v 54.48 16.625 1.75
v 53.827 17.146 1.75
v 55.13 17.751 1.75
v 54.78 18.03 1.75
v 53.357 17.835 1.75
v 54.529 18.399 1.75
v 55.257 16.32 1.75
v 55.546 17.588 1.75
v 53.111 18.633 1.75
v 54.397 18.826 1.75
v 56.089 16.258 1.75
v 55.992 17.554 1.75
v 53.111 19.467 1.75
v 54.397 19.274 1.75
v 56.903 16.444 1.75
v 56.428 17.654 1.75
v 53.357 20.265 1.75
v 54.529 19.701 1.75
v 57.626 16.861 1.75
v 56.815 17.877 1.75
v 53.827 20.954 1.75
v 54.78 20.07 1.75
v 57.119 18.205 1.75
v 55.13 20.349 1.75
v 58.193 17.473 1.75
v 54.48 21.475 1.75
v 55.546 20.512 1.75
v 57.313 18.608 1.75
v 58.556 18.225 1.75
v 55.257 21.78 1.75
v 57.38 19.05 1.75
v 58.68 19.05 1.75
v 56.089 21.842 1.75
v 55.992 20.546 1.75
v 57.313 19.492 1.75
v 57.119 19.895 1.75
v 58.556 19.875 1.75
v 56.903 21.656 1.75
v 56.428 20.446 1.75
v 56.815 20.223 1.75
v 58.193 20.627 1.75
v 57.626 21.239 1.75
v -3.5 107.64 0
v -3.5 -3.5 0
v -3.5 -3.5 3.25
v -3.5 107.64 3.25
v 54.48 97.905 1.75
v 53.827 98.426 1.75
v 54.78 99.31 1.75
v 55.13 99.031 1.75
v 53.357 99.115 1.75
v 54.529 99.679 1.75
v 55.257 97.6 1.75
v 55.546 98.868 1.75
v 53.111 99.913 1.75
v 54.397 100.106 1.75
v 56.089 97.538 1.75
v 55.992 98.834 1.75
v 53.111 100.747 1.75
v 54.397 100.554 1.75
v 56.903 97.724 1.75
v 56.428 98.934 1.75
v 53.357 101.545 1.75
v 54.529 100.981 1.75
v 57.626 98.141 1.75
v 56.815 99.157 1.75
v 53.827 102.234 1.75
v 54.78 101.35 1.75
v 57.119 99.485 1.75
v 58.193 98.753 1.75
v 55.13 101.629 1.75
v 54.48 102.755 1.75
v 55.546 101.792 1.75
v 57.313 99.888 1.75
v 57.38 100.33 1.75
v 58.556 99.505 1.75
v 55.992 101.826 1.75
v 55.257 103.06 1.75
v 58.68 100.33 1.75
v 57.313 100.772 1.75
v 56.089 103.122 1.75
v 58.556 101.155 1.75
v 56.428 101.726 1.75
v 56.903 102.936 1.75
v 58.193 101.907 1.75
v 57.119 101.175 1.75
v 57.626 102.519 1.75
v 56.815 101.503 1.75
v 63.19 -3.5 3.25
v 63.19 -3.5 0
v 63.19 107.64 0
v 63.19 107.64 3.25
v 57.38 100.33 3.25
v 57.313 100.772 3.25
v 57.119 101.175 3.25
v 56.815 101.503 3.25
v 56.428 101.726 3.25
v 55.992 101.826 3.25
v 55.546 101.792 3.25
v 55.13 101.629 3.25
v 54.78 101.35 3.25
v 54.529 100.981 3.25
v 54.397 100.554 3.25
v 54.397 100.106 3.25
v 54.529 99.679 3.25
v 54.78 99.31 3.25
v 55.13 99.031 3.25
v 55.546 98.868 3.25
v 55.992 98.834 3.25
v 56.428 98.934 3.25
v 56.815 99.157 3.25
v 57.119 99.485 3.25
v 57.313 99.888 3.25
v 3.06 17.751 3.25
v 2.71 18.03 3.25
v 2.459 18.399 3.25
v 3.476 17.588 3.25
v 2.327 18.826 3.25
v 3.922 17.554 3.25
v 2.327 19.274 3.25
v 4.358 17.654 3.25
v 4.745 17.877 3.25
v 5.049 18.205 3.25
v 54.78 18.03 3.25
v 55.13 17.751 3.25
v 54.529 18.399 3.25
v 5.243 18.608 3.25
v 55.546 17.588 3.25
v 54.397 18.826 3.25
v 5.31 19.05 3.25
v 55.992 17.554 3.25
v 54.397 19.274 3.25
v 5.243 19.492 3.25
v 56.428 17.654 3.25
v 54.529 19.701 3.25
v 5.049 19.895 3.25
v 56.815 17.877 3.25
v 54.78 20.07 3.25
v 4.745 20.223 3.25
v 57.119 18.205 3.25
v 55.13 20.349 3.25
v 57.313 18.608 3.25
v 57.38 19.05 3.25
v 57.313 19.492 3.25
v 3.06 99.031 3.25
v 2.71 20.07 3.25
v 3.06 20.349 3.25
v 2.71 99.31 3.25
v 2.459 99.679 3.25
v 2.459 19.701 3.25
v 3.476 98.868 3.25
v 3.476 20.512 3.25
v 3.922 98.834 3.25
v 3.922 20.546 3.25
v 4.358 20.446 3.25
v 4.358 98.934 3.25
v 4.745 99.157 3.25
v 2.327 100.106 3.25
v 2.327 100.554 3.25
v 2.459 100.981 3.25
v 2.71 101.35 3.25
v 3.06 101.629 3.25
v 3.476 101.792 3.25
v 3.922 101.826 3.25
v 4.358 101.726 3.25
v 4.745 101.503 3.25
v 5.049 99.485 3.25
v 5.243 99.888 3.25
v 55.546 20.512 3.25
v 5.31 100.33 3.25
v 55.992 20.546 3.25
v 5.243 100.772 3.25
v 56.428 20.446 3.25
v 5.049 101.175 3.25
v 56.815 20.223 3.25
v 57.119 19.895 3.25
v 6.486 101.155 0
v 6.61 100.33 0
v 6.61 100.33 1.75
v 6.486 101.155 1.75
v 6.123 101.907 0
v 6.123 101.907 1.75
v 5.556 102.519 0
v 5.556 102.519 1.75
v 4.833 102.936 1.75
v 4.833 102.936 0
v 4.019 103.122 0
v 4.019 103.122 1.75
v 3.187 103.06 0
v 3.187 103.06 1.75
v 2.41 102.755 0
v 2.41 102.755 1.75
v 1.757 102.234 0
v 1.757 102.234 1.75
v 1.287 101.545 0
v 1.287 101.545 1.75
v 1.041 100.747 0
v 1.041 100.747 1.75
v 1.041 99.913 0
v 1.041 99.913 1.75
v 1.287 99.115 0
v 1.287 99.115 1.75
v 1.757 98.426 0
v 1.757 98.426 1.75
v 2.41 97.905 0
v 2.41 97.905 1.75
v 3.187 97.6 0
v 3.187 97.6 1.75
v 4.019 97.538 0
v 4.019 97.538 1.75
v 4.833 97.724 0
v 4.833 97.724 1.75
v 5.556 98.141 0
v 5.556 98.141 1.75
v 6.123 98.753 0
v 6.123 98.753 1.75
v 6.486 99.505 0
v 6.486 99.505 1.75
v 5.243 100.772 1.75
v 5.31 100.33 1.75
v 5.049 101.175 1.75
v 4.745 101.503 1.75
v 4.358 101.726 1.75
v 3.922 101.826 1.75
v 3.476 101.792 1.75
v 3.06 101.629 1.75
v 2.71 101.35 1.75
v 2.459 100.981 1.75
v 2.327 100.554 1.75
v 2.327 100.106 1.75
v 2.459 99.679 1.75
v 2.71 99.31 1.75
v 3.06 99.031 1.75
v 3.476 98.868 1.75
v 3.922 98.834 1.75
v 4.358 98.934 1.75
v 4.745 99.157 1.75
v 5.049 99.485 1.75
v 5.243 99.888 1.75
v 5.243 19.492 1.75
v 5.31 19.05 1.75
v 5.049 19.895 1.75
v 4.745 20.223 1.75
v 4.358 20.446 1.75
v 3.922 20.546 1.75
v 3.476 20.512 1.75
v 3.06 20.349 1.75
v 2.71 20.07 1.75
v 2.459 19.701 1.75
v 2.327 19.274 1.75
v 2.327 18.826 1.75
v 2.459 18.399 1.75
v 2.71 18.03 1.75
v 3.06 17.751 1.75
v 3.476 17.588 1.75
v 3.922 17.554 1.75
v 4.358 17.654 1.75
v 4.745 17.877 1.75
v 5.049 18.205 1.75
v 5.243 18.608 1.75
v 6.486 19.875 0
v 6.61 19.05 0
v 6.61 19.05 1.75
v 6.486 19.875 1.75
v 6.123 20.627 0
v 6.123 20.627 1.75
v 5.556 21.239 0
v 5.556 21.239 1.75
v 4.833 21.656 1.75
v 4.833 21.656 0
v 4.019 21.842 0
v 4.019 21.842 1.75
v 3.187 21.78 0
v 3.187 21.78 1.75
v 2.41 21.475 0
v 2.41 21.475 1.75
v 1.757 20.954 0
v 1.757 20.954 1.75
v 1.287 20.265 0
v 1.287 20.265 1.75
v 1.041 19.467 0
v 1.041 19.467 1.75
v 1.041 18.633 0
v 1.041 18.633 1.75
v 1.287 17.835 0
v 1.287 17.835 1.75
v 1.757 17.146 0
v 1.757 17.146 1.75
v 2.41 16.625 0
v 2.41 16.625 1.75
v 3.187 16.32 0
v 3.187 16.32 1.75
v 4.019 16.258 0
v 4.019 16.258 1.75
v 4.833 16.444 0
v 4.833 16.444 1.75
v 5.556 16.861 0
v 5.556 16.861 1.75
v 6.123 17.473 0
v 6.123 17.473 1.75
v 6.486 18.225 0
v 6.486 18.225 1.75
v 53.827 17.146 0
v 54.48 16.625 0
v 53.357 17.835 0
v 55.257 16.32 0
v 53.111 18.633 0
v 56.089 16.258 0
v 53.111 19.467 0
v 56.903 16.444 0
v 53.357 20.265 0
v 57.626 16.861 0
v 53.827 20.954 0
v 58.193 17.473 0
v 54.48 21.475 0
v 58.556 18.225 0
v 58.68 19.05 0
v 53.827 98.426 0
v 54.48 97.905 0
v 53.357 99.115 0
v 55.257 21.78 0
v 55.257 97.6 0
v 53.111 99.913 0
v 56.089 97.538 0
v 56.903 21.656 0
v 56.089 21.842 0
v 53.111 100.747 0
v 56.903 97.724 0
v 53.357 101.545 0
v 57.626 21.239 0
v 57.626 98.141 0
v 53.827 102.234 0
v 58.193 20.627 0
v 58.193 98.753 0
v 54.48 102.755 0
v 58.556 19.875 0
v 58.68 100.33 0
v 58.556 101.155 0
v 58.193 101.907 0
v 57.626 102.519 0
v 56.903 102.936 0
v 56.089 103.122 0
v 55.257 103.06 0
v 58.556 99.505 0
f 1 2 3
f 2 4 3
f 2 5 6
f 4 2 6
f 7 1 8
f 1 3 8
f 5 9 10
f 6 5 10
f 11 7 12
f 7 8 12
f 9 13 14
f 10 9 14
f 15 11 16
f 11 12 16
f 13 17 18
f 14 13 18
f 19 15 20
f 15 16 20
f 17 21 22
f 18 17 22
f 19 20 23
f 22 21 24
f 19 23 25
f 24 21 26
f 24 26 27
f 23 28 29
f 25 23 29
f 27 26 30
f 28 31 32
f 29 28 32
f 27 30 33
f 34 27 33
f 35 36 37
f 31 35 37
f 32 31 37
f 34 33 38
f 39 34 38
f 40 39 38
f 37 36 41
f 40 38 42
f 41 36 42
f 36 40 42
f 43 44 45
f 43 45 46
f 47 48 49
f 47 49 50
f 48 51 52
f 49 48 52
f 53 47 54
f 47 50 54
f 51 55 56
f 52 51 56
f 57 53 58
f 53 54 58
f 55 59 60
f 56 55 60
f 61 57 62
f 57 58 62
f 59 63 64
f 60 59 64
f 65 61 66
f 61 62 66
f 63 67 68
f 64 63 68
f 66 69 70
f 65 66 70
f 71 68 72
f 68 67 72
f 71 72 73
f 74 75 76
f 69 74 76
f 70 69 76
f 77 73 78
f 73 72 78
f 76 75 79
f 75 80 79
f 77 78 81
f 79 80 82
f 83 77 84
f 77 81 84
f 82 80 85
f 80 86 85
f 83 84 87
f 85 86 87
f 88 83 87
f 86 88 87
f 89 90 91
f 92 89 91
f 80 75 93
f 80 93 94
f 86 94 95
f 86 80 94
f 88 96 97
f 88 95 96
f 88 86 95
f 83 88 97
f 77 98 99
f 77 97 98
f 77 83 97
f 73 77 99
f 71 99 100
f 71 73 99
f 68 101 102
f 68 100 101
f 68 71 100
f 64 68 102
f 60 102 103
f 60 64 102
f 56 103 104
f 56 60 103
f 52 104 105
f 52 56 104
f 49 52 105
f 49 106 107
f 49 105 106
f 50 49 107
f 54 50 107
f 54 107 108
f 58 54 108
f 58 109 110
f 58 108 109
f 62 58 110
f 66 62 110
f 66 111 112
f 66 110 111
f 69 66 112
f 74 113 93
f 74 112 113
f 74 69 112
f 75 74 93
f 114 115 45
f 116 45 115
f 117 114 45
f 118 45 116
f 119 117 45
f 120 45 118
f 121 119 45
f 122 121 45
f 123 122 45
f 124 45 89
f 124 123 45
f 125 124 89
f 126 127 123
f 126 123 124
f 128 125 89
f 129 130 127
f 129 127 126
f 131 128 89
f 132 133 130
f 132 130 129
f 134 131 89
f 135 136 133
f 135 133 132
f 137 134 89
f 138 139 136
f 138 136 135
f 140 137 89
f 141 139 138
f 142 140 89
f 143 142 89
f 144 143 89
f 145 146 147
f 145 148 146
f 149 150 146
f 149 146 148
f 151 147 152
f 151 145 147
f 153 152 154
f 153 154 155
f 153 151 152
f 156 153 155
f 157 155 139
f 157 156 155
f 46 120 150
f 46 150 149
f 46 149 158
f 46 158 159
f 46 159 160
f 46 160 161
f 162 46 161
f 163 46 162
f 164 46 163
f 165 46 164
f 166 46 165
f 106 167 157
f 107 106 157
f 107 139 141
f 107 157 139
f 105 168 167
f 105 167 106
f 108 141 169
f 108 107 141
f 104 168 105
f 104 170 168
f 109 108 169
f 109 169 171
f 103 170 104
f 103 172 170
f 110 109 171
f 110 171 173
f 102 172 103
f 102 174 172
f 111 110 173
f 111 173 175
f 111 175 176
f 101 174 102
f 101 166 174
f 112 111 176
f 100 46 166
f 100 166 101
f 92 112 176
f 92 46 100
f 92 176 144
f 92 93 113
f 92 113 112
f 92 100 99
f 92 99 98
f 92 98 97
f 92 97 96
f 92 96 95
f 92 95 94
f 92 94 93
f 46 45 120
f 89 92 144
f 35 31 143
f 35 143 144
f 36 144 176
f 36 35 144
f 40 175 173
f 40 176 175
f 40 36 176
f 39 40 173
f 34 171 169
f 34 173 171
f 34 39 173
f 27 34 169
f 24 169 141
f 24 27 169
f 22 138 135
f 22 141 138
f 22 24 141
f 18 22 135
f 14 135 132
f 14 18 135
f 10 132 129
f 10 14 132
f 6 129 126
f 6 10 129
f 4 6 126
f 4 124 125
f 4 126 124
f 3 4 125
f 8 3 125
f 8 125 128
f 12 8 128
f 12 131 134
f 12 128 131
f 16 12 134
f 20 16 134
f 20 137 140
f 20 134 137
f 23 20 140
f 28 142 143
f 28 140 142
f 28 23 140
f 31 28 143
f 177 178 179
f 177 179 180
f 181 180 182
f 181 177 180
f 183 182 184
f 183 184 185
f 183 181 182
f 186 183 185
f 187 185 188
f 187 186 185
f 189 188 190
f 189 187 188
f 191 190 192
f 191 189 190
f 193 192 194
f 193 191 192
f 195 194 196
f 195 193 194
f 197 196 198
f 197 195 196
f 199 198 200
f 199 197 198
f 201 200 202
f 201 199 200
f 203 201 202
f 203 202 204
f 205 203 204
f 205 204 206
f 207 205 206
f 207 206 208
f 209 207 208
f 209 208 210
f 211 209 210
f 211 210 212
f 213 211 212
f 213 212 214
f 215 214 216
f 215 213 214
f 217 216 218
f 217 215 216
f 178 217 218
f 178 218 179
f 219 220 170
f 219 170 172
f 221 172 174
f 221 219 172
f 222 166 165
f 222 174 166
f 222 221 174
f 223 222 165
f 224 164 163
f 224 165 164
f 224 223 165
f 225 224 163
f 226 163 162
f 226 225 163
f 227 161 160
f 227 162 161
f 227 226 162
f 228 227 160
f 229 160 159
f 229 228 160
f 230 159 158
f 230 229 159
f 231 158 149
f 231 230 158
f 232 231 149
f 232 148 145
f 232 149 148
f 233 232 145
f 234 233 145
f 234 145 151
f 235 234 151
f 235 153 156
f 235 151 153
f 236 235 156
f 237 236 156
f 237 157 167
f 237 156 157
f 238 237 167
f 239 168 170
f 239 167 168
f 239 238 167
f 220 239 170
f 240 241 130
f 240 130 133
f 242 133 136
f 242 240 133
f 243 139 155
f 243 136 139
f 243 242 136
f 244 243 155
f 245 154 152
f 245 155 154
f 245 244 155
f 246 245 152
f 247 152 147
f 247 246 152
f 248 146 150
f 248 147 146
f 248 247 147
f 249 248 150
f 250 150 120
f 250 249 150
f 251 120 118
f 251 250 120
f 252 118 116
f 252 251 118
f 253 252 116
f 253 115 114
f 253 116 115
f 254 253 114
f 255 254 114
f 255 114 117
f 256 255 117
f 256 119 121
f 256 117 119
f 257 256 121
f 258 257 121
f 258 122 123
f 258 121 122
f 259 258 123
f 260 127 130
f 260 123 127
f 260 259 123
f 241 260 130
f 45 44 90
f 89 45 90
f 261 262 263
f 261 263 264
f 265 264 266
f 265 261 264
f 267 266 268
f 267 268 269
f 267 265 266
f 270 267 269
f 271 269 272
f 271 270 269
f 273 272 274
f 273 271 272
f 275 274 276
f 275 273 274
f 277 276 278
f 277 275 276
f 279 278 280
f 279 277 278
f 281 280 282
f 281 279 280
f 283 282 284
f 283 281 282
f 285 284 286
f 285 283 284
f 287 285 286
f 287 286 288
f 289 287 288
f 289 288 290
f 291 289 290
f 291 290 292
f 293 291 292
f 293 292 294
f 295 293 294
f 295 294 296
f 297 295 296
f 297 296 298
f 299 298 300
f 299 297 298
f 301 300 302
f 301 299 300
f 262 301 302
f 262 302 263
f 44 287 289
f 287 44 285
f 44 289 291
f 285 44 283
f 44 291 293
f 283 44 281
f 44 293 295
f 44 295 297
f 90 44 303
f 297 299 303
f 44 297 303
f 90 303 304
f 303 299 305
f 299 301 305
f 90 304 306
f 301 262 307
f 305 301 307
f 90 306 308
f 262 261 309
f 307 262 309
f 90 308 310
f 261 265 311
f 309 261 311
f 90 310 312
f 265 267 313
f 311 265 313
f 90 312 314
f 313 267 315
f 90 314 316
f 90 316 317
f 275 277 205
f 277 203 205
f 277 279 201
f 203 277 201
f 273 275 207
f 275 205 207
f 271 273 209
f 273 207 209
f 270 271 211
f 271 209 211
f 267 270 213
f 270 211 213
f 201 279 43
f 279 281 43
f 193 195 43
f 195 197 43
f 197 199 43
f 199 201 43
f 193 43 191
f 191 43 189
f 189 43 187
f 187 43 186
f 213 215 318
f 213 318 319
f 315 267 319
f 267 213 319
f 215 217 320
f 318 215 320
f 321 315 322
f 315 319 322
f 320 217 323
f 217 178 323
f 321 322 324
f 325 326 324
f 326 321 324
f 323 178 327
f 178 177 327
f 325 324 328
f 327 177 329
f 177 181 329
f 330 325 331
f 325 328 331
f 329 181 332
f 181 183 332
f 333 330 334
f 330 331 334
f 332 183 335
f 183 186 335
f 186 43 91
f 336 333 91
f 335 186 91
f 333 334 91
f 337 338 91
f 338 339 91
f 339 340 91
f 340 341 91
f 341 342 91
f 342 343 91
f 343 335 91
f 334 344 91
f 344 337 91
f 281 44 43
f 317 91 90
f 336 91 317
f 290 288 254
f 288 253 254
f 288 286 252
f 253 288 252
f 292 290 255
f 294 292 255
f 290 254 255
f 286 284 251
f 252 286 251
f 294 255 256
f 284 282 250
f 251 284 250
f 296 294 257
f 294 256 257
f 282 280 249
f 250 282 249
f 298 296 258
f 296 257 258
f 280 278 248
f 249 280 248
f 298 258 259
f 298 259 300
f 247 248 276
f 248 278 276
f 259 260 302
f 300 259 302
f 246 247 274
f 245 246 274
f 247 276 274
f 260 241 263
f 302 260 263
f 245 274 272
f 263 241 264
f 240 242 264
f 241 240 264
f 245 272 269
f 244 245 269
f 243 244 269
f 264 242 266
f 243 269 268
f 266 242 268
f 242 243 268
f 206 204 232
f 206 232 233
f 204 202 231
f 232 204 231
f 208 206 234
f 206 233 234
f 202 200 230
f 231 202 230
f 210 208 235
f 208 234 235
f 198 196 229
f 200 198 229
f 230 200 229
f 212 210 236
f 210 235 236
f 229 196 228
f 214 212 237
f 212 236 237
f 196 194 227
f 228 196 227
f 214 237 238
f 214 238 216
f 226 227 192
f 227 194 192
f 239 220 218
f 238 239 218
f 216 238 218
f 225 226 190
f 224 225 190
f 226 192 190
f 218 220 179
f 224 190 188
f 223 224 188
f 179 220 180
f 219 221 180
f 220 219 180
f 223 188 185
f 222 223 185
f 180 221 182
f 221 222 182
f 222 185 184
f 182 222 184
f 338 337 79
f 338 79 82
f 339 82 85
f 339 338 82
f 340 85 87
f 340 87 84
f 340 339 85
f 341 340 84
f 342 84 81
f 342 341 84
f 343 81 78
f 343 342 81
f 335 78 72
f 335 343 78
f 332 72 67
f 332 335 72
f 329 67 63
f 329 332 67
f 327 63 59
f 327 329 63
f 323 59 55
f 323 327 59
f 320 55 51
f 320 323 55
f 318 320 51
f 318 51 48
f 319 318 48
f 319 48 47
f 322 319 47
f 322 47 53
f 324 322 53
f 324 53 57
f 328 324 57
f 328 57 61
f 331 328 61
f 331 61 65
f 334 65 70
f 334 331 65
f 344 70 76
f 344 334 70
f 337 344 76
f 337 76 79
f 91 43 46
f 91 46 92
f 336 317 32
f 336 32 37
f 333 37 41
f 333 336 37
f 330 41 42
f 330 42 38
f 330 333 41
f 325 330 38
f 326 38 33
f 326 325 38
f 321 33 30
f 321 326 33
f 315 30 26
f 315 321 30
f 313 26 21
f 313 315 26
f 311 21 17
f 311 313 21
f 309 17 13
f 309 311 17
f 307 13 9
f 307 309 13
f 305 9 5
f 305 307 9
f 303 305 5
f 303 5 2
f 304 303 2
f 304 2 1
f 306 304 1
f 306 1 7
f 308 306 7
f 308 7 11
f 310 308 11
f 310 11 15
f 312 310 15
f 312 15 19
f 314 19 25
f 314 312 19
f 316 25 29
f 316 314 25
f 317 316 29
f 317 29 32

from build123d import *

# Parameters (mm, degrees)
CYLINDER007_R     = 2.8
CYLINDER007_DEPTH = 1.75
CYLINDER006_R     = 2.8
CYLINDER006_DEPTH = 1.75
CYLINDER005_R     = 2.8
CYLINDER005_DEPTH = 1.75
CYLINDER004_R     = 2.8
CYLINDER004_DEPTH = 1.75
CYLINDER003_R     = 1.5
CYLINDER003_DEPTH = 10
CYLINDER002_R     = 1.5
CYLINDER002_DEPTH = 10
CYLINDER001_R     = 1.5
CYLINDER001_DEPTH = 10
CYLINDER_R        = 1.5
CYLINDER_DEPTH    = 10
BOX001_W          = 66.69
BOX001_H          = 111.14
BOX001_DEPTH      = 3.25


with BuildPart() as cylinder007:
    # Cylinder007 → Cylinder007 (new body)
    with BuildSketch(Plane(origin=(55.88, 100.33, 0), x_dir=(1, 0, 0), z_dir=(0, 0, 1))):
        Circle(CYLINDER007_R)
    extrude(amount=CYLINDER007_DEPTH)


with BuildPart() as cylinder006:
    # Cylinder006 → Cylinder006 (new body)
    with BuildSketch(Plane(origin=(3.81, 100.33, 0), x_dir=(1, 0, 0), z_dir=(0, 0, 1))):
        Circle(CYLINDER006_R)
    extrude(amount=CYLINDER006_DEPTH)


with BuildPart() as cylinder005:
    # Cylinder005 → Cylinder005 (new body)
    with BuildSketch(Plane(origin=(55.88, 19.05, 0), x_dir=(1, 0, 0), z_dir=(0, 0, 1))):
        Circle(CYLINDER005_R)
    extrude(amount=CYLINDER005_DEPTH)


with BuildPart() as cylinder004:
    # Cylinder004 → Cylinder004 (new body)
    with BuildSketch(Plane(origin=(3.81, 19.05, 0), x_dir=(1, 0, 0), z_dir=(0, 0, 1))):
        Circle(CYLINDER004_R)
    extrude(amount=CYLINDER004_DEPTH)


with BuildPart() as cylinder003:
    # Cylinder003 → Cylinder003 (new body)
    with BuildSketch(Plane(origin=(55.88, 100.33, -1), x_dir=(1, 0, 0), z_dir=(0, 0, 1))):
        Circle(CYLINDER003_R)
    extrude(amount=CYLINDER003_DEPTH)


with BuildPart() as cylinder002:
    # Cylinder002 → Cylinder002 (new body)
    with BuildSketch(Plane(origin=(3.81, 100.33, -1), x_dir=(1, 0, 0), z_dir=(0, 0, 1))):
        Circle(CYLINDER002_R)
    extrude(amount=CYLINDER002_DEPTH)


with BuildPart() as cylinder001:
    # Cylinder001 → Cylinder001 (new body)
    with BuildSketch(Plane(origin=(55.88, 19.05, -1), x_dir=(1, 0, 0), z_dir=(0, 0, 1))):
        Circle(CYLINDER001_R)
    extrude(amount=CYLINDER001_DEPTH)


with BuildPart() as cylinder:
    # Cylinder → Cylinder (new body)
    with BuildSketch(Plane(origin=(3.81, 19.05, -1), x_dir=(1, 0, 0), z_dir=(0, 0, 1))):
        Circle(CYLINDER_R)
    extrude(amount=CYLINDER_DEPTH)


with BuildPart() as cut007:
    # Box001 → Box001 (new body)
    with BuildSketch(Plane(origin=(-3.5, -3.5, 0), x_dir=(1, 0, 0), z_dir=(0, 0, 1))):
        with Locations((33.345, 55.57)):
            Rectangle(BOX001_W, BOX001_H)
    extrude(amount=BOX001_DEPTH)

    # Cut: cut Cylinder
    add(cylinder.part, mode=Mode.SUBTRACT)

    # Cut001: cut Cylinder001
    add(cylinder001.part, mode=Mode.SUBTRACT)

    # Cut002: cut Cylinder002
    add(cylinder002.part, mode=Mode.SUBTRACT)

    # Cut003: cut Cylinder003
    add(cylinder003.part, mode=Mode.SUBTRACT)

    # Cut004: cut Cylinder004
    add(cylinder004.part, mode=Mode.SUBTRACT)

    # Cut005: cut Cylinder005
    add(cylinder005.part, mode=Mode.SUBTRACT)

    # Cut006: cut Cylinder006
    add(cylinder006.part, mode=Mode.SUBTRACT)

    # Cut007: cut Cylinder007
    add(cylinder007.part, mode=Mode.SUBTRACT)


solid = cut007.part
